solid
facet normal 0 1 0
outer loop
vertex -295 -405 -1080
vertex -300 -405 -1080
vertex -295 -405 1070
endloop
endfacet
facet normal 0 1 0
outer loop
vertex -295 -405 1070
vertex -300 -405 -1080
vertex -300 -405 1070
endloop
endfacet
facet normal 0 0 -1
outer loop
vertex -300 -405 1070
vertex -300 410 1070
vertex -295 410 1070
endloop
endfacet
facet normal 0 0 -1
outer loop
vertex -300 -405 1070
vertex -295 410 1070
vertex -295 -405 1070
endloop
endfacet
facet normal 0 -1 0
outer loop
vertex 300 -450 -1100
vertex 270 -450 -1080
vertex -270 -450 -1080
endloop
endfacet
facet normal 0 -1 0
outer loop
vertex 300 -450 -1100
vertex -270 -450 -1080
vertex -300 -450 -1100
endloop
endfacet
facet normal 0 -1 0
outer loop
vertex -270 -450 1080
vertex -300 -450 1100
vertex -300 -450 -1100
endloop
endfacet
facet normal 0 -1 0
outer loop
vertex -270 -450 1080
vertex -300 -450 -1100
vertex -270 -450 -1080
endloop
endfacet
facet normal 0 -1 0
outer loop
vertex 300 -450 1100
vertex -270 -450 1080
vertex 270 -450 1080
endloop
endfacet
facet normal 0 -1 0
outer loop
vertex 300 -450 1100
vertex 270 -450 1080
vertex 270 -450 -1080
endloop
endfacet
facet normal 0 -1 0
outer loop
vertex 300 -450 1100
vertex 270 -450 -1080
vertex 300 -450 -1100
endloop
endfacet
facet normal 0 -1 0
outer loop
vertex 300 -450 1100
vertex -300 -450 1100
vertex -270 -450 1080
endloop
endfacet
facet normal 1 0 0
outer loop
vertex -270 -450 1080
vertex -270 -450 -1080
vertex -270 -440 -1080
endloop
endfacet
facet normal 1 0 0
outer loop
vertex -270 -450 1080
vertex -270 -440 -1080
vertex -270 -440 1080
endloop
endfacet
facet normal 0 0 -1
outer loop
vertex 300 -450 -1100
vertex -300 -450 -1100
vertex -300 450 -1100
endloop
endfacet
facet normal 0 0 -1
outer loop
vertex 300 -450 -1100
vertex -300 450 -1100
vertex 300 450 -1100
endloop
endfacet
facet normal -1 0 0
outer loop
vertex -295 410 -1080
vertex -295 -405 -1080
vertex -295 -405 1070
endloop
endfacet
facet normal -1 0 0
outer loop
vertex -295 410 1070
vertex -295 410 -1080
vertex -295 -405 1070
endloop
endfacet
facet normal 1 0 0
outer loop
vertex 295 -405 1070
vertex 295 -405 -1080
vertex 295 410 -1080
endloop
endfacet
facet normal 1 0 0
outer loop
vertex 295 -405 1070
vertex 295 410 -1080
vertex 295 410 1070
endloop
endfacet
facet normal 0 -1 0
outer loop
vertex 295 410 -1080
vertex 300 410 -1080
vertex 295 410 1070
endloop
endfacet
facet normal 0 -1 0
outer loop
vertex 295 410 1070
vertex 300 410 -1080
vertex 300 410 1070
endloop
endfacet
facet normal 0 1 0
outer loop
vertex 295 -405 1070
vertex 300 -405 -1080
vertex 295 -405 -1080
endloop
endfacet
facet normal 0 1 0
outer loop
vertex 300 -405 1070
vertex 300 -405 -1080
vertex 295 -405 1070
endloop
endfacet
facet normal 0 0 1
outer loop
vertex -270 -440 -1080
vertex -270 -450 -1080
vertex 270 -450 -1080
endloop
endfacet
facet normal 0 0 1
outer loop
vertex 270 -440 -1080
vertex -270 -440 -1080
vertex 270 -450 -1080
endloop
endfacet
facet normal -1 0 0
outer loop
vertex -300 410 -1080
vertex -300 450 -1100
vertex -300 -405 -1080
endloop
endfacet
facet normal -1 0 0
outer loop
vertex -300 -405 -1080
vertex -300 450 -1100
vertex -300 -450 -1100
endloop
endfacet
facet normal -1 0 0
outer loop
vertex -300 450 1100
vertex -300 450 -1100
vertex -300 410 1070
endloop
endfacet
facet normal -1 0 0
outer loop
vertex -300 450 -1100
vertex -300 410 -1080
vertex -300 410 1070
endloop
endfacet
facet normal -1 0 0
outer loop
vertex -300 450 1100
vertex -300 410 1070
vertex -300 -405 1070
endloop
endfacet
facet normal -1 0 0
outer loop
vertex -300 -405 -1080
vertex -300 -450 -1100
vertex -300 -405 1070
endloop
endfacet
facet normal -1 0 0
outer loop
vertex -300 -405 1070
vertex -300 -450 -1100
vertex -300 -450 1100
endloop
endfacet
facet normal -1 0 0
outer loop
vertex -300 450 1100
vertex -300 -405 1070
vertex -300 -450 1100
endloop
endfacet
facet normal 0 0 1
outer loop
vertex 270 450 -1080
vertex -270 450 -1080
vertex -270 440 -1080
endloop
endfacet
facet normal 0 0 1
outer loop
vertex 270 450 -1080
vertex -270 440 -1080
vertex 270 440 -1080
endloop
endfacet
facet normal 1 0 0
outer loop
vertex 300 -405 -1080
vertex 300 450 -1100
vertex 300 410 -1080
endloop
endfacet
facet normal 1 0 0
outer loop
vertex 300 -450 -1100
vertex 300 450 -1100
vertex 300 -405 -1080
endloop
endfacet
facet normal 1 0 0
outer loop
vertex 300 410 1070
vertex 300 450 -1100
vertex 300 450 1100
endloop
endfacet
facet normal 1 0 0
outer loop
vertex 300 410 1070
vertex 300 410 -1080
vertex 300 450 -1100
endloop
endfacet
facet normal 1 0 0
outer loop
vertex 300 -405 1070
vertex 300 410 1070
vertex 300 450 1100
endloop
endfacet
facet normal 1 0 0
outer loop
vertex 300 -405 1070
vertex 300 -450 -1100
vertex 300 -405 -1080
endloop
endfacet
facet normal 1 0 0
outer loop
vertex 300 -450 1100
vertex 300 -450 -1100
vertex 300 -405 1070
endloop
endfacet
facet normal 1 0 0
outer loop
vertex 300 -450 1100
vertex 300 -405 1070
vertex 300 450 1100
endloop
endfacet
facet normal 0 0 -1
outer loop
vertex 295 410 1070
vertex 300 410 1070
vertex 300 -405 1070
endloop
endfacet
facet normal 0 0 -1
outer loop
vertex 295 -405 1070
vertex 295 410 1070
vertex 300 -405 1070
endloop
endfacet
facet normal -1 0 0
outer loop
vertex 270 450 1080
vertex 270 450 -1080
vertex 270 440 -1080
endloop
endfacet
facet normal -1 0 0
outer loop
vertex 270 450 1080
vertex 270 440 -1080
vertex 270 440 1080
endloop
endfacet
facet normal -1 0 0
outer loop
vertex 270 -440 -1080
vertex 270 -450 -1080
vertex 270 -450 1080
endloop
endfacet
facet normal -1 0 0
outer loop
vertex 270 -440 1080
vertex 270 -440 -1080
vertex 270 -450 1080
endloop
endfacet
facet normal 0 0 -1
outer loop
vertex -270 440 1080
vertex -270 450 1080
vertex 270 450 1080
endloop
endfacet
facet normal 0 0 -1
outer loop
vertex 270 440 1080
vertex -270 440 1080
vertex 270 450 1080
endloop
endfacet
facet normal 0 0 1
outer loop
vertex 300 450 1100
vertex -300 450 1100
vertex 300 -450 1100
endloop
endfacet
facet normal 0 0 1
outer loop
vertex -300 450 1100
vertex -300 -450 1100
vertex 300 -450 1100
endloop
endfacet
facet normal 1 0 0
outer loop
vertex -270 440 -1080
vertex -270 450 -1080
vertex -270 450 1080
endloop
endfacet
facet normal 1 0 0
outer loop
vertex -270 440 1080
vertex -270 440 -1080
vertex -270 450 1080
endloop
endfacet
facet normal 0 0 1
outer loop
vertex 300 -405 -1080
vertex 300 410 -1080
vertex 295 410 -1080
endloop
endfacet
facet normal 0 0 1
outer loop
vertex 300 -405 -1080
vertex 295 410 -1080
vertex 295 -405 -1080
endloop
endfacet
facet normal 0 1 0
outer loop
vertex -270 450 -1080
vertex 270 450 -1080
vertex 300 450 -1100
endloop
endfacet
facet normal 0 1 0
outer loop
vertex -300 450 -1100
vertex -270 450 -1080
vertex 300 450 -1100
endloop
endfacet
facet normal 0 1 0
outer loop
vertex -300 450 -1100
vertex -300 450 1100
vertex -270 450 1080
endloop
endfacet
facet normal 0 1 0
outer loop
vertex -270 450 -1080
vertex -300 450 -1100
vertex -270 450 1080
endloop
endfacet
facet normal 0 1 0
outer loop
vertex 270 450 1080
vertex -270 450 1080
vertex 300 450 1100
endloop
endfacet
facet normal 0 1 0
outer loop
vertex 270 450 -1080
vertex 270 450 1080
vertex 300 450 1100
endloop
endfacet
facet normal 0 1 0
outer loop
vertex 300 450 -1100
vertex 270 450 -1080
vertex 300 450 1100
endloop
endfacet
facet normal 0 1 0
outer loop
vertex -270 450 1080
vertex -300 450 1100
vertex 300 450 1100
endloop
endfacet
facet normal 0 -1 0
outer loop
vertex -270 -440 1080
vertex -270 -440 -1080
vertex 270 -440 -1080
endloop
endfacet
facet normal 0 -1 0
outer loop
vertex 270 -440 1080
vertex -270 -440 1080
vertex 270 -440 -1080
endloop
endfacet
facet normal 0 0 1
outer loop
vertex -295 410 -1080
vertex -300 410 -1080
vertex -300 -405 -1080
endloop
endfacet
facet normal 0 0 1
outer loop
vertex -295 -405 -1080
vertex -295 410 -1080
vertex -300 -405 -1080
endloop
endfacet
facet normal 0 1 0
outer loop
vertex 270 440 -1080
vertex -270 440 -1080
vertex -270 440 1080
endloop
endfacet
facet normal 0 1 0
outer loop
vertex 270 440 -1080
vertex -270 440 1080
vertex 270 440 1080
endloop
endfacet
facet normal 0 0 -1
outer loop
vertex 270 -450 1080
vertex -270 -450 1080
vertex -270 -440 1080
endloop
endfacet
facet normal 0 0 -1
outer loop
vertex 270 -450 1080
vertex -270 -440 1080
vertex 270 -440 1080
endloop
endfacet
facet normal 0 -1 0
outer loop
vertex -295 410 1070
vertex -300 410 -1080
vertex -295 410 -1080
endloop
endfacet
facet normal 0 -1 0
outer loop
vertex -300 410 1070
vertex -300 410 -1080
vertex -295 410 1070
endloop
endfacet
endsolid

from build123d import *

# Parameters (mm, degrees)
SKETCH012_W     = 600
SKETCH012_H     = 2200
PAD007_DEPTH    = 450
SKETCH010_W     = 540
SKETCH010_H     = 2160
POCKET002_DEPTH = 10
SKETCH011_W     = 2150
SKETCH011_H     = 815
POCKET003_DEPTH = 5


with BuildPart() as part:
    # Sketch012 → Pad007 (new body, symmetric)
    with BuildSketch(Plane.XZ):
        Rectangle(SKETCH012_W, SKETCH012_H)
    extrude(amount=PAD007_DEPTH, both=True)

    # Sketch010 (on Face6 of Pad007) → Pocket002 (cut)
    with BuildSketch(Plane.XZ.offset(450)):
        Rectangle(SKETCH010_W, SKETCH010_H)
    pocket002 = extrude(amount=-POCKET002_DEPTH, mode=Mode.SUBTRACT)

    # Mirrored: Pocket002 across XZ
    add(pocket002.mirror(Plane.XZ), mode=Mode.SUBTRACT)

    # Sketch011 (on Face3 of Mirrored) → Pocket003 (cut)
    with BuildSketch(Plane(origin=(300, 0, 0), x_dir=(0, 0, 1), z_dir=(1, 0, 0))):
        with Locations((-5, -2.5)):
            Rectangle(SKETCH011_W, SKETCH011_H)
    pocket003 = extrude(amount=-POCKET003_DEPTH, mode=Mode.SUBTRACT)

    # Mirrored001: Pocket003 across YZ
    add(pocket003.mirror(Plane.YZ), mode=Mode.SUBTRACT)


solid = part.part
